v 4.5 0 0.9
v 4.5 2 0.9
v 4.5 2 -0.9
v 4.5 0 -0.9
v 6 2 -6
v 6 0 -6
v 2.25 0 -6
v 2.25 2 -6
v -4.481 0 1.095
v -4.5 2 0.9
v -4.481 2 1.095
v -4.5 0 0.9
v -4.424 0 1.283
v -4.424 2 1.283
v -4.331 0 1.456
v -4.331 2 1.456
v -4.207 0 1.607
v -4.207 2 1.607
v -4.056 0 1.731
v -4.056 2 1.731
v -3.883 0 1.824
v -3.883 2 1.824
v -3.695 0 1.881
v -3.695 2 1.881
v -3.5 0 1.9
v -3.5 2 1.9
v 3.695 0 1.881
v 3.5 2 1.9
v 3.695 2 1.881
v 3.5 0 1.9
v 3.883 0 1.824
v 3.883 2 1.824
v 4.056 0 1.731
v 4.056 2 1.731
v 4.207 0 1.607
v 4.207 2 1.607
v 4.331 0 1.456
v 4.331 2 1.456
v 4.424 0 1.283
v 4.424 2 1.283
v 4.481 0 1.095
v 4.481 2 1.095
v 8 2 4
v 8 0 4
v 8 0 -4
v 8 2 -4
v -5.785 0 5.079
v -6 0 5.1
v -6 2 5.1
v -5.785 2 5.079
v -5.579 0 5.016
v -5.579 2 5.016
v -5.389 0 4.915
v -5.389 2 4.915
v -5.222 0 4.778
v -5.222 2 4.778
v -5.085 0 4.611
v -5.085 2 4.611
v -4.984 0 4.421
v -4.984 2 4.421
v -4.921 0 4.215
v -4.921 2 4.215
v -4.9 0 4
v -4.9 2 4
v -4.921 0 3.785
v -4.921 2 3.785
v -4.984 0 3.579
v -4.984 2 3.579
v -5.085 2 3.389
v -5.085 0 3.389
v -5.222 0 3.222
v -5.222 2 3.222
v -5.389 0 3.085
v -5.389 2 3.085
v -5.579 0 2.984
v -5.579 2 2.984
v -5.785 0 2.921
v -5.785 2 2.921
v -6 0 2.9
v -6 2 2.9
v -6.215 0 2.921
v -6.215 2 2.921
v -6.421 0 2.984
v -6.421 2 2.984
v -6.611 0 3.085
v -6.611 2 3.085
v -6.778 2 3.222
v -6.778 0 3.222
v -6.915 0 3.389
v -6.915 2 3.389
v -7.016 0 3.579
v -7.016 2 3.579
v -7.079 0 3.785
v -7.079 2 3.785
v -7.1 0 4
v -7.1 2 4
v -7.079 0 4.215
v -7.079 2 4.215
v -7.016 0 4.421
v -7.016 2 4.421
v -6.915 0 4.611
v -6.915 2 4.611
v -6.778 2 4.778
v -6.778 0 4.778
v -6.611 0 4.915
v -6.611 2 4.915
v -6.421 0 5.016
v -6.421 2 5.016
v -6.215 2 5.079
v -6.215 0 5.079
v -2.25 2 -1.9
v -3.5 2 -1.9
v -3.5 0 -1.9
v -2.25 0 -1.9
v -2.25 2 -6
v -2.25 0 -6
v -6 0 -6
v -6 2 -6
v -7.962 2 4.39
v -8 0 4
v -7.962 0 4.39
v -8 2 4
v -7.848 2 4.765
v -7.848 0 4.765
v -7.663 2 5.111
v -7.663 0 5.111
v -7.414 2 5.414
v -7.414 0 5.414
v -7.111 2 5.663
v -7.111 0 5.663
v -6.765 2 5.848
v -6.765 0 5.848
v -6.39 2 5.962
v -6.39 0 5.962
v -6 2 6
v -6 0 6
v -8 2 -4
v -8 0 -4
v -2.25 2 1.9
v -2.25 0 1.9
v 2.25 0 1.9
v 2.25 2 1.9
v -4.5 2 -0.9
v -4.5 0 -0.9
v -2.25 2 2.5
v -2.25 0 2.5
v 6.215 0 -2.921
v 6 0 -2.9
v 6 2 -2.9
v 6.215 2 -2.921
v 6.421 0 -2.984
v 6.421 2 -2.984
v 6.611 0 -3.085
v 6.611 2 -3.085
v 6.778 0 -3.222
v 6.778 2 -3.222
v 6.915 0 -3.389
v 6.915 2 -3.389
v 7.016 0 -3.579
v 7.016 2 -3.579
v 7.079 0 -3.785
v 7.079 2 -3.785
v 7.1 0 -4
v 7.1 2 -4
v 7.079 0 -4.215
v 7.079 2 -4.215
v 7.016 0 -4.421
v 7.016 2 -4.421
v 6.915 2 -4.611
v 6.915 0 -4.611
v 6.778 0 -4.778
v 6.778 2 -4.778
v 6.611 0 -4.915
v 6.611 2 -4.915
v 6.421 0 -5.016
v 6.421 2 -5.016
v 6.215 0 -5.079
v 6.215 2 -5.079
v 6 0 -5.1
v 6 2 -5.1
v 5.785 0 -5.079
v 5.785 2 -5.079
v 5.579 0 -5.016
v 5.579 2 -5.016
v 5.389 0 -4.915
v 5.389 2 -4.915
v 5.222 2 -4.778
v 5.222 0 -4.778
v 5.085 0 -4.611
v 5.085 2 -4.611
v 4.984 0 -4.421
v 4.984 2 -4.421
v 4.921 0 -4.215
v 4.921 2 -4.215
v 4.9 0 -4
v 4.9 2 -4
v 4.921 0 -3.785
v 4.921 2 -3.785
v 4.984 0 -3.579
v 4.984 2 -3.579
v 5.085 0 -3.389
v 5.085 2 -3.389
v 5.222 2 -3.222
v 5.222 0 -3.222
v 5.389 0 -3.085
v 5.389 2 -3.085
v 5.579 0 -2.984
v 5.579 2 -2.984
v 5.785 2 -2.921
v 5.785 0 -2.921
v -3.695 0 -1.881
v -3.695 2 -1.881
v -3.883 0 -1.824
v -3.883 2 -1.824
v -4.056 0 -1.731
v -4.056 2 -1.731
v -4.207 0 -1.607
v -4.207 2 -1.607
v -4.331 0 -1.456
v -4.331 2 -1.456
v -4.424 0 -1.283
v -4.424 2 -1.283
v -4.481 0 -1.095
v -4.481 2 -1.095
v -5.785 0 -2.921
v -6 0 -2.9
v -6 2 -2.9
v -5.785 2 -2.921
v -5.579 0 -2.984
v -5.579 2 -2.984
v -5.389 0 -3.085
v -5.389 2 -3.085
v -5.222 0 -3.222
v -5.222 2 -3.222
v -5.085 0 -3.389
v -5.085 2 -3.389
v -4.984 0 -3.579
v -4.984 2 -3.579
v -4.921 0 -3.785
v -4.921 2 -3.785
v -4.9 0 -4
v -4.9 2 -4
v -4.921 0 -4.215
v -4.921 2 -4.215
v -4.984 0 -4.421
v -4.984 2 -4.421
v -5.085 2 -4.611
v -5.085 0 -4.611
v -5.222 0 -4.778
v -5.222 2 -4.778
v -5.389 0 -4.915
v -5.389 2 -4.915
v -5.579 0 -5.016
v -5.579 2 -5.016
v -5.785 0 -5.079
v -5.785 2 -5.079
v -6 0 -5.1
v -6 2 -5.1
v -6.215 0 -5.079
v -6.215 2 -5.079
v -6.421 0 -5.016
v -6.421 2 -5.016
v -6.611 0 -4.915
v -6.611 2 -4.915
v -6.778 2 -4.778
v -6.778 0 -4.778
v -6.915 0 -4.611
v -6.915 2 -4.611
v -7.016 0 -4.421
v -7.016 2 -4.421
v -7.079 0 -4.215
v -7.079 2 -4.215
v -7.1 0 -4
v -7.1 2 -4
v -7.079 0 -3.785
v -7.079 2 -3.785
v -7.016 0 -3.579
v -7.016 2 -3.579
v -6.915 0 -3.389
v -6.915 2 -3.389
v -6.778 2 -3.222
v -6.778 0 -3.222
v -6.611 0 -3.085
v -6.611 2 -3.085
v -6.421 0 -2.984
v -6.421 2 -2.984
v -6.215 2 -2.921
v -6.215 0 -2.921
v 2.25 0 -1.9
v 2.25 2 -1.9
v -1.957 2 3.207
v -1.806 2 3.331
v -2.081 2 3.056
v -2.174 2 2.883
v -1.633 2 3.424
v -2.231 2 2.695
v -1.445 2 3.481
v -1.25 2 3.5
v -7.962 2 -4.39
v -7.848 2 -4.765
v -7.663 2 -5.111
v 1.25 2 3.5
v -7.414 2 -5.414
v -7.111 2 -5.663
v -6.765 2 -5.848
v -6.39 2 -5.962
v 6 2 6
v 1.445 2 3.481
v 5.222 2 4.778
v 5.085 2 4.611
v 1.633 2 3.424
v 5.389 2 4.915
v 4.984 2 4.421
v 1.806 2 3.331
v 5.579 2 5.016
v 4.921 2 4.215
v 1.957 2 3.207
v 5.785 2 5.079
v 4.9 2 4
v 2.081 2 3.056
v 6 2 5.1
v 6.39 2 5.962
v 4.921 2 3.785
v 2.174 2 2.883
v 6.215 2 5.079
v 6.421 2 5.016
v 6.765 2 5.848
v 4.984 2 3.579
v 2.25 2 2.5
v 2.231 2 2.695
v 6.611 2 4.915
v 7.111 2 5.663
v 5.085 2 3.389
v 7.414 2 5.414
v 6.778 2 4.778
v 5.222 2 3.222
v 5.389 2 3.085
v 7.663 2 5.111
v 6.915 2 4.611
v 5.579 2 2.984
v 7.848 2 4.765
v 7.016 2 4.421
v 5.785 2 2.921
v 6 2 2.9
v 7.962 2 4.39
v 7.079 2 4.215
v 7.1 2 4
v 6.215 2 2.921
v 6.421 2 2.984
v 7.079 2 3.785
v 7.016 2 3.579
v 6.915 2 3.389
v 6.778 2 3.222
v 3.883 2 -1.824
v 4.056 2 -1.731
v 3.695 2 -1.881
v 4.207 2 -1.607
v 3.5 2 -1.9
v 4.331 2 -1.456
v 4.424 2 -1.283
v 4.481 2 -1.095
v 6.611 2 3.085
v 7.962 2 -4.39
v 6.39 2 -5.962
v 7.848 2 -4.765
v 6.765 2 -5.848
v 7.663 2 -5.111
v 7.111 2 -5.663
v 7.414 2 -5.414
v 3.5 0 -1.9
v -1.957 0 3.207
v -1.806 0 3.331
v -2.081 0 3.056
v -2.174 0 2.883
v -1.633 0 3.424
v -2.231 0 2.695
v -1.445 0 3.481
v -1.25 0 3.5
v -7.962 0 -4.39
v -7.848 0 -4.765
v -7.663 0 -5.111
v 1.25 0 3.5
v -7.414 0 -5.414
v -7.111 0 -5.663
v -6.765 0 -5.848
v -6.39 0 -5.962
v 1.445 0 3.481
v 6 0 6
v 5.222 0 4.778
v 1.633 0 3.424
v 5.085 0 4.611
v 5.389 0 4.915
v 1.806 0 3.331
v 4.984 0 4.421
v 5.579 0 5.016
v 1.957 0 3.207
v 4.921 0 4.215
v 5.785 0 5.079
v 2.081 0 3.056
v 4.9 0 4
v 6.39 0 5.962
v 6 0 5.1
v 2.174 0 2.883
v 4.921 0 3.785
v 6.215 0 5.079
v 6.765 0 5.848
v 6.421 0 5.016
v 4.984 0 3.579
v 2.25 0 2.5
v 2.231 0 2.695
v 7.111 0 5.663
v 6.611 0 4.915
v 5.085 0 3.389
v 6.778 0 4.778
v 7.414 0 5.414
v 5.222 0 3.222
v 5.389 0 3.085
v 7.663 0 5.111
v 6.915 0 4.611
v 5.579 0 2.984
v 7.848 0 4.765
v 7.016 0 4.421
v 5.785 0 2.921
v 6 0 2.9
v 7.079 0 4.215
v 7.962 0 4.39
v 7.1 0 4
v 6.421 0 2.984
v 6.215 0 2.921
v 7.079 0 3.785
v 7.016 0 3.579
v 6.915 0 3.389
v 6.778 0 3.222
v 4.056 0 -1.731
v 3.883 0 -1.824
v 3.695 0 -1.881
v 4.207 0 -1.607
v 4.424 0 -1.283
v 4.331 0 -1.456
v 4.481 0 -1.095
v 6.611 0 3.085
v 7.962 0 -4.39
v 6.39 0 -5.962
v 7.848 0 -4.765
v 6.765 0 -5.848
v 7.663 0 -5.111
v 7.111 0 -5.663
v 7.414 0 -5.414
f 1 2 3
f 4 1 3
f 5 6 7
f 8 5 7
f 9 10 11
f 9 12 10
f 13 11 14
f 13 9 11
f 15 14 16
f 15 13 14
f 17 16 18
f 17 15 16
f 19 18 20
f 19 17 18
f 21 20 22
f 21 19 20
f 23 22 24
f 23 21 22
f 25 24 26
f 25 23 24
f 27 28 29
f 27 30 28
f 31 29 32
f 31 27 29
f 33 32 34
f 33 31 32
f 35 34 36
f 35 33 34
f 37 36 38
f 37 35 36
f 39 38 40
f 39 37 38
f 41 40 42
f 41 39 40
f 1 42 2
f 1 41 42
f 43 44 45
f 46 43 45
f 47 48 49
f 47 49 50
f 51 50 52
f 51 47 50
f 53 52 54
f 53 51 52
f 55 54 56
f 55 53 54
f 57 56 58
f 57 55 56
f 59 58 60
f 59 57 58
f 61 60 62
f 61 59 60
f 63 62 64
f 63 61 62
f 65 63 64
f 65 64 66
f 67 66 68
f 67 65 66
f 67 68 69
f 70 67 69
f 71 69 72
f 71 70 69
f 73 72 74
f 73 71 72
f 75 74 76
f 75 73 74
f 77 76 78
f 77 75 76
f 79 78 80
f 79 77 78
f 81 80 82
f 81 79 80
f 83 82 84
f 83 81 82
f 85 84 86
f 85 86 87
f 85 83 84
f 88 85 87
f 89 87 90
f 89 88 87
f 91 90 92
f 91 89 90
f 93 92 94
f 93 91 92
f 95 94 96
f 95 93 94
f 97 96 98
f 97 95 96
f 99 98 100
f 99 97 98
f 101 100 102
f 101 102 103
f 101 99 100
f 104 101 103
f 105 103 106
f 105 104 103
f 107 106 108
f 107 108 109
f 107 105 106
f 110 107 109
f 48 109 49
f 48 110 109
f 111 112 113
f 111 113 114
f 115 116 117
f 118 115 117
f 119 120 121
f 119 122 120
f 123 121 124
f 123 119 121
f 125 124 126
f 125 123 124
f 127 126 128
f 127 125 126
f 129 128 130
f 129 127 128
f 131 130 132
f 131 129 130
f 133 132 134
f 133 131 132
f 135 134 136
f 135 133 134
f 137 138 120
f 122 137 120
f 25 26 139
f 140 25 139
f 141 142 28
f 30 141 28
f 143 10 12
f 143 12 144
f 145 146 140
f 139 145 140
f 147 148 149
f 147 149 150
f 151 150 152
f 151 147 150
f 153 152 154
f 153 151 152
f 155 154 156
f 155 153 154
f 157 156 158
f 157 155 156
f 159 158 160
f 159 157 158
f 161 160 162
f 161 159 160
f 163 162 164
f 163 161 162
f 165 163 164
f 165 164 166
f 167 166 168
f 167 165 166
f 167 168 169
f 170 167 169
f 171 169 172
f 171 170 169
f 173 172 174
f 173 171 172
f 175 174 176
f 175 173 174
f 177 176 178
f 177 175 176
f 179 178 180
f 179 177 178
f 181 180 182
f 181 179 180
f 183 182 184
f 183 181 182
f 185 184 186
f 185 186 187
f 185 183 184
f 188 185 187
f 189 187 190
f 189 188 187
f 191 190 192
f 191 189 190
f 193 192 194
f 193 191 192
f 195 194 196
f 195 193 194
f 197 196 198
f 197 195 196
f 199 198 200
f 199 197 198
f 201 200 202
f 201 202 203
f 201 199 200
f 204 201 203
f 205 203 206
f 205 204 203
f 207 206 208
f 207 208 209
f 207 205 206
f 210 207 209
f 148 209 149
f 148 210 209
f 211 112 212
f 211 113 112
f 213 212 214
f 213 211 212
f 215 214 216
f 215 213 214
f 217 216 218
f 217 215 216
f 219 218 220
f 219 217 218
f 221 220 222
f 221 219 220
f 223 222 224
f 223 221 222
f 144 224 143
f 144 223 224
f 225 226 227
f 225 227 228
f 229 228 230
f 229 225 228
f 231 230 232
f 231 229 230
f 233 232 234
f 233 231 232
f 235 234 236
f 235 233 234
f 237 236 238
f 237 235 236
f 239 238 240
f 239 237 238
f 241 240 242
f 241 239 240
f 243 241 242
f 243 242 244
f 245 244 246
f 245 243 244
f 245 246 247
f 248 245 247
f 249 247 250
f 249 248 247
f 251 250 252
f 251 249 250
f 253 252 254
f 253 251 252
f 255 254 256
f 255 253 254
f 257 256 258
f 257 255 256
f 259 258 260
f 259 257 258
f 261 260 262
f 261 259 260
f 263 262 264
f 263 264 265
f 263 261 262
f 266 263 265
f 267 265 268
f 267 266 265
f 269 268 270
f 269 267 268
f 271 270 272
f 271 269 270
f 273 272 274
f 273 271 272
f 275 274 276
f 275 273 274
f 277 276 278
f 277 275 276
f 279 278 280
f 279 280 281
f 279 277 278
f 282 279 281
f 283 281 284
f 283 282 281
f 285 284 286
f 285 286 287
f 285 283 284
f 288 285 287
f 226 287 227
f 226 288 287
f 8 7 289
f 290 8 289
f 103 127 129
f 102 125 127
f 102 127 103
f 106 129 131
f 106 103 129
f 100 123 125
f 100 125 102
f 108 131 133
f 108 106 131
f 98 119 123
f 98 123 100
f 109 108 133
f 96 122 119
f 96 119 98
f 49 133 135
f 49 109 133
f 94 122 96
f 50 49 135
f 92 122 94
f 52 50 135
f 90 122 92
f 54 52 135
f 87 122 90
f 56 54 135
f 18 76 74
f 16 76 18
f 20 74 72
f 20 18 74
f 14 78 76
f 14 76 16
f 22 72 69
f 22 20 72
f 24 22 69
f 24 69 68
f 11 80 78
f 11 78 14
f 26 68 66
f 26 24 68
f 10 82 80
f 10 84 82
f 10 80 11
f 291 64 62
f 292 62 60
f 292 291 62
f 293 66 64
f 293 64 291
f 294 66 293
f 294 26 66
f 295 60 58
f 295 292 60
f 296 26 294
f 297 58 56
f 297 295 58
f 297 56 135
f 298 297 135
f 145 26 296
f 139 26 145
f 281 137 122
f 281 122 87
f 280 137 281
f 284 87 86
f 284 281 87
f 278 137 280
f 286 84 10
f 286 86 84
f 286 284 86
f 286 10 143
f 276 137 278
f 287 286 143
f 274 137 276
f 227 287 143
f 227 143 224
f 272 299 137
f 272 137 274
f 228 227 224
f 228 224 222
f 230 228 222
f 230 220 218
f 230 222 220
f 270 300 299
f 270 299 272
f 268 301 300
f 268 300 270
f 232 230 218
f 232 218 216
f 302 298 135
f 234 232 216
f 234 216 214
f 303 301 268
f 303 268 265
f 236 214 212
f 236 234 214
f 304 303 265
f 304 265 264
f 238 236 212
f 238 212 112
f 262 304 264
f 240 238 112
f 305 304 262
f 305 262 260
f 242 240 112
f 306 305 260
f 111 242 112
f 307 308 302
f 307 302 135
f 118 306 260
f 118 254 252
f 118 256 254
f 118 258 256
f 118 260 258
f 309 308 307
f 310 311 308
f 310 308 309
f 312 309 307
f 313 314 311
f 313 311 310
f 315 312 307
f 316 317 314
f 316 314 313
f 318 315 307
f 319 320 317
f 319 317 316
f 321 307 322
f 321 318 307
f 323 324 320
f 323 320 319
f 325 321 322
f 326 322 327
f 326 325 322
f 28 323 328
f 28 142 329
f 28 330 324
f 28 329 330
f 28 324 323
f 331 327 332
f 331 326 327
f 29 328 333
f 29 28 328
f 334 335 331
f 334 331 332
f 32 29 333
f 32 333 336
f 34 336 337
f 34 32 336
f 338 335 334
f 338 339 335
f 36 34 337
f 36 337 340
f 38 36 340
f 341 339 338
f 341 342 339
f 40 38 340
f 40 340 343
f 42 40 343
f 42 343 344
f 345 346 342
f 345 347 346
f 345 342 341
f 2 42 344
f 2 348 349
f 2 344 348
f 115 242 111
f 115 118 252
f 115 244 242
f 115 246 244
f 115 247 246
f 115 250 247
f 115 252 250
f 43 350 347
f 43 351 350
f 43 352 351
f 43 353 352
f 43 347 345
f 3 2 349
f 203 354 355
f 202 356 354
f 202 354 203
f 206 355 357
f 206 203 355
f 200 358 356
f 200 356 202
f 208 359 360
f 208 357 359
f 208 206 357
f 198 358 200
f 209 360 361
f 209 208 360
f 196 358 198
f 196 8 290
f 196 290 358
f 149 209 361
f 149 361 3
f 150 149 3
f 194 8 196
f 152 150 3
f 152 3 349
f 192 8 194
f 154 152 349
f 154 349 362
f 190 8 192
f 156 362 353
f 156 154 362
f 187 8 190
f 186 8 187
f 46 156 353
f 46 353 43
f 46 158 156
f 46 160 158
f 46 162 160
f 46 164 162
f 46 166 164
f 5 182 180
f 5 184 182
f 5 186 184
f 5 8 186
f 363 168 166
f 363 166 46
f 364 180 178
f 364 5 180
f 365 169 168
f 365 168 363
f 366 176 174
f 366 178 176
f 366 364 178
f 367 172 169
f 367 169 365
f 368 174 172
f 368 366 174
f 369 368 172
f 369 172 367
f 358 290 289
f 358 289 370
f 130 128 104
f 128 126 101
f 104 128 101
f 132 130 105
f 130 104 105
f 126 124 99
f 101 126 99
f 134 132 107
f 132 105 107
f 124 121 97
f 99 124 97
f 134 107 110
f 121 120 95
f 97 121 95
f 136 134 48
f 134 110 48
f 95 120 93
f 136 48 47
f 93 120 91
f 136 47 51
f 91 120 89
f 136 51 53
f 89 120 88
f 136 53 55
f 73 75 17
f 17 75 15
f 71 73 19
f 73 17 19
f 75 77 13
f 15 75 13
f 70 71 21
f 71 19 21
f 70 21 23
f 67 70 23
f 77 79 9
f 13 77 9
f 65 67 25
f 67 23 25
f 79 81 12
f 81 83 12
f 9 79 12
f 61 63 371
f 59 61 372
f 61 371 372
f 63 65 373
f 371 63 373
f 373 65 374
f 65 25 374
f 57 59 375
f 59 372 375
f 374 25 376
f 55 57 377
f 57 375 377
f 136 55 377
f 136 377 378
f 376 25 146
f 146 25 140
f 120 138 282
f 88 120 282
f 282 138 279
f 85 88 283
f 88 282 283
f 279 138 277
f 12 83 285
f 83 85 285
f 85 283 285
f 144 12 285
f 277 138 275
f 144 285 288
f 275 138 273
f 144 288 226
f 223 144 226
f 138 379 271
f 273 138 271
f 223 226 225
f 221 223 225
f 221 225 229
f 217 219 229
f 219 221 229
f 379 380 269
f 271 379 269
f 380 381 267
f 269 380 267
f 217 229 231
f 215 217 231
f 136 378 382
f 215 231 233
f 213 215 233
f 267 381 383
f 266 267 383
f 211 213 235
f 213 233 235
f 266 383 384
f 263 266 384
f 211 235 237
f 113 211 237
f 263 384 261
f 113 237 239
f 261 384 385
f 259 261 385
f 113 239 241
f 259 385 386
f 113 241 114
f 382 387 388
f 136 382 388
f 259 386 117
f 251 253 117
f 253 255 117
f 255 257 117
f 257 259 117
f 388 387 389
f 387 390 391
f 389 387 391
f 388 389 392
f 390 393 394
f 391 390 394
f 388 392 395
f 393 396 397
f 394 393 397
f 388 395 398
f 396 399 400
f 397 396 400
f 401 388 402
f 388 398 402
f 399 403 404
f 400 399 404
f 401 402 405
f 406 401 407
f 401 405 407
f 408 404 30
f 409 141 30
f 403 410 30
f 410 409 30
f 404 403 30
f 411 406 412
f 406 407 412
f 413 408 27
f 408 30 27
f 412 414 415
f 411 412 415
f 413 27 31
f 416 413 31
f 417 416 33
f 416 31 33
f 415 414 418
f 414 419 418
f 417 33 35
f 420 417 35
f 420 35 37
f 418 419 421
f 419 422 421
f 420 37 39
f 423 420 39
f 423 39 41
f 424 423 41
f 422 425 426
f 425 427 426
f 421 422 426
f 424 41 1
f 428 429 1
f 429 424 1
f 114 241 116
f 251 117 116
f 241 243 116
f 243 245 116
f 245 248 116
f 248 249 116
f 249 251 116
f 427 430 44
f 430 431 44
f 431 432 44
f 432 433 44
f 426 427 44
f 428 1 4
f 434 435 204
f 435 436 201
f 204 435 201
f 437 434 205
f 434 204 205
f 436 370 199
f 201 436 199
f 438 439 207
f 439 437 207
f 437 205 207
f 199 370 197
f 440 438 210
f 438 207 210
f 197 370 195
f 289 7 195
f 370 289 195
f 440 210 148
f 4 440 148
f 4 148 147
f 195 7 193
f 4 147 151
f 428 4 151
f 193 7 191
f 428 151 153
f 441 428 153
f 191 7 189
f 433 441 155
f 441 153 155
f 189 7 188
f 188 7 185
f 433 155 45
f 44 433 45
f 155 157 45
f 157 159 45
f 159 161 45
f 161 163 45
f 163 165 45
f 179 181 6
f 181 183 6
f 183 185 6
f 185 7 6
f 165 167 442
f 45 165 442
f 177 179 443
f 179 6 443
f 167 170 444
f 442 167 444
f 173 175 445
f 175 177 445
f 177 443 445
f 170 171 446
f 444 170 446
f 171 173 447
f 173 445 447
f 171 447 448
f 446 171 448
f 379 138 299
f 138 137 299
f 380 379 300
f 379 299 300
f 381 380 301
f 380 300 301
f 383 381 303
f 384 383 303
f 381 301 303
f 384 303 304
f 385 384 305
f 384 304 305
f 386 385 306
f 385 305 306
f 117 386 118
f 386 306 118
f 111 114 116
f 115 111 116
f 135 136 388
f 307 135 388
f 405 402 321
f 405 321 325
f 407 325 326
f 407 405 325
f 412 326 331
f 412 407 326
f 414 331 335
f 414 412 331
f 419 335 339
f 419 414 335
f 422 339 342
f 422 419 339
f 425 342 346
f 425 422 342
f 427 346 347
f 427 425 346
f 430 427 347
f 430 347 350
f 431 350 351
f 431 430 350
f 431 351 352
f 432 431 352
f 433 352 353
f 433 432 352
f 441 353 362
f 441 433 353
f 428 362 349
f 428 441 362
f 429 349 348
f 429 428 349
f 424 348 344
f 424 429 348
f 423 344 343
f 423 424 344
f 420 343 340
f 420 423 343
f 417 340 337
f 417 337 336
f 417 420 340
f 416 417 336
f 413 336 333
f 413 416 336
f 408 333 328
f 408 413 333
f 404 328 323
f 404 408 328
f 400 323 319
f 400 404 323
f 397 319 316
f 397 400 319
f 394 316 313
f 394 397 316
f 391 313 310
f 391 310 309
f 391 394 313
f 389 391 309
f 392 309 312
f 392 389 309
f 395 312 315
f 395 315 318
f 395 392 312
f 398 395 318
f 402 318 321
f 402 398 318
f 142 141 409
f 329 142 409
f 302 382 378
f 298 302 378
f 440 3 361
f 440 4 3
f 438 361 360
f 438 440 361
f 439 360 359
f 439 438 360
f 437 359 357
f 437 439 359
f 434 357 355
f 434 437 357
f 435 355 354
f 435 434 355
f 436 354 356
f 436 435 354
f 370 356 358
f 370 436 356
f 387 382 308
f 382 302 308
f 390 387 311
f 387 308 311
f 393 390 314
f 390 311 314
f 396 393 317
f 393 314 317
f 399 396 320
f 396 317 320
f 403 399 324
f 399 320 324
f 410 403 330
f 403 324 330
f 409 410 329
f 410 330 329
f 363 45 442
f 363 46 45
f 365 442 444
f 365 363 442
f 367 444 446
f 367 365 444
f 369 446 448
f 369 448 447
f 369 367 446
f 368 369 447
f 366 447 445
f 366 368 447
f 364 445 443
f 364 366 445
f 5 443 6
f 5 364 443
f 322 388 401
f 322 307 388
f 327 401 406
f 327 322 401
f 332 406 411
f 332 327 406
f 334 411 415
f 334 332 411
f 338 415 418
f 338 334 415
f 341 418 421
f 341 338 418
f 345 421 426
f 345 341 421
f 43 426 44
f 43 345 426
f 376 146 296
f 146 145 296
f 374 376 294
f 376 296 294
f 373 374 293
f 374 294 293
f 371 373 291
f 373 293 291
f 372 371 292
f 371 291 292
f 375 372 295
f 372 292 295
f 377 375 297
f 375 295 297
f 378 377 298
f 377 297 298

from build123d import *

# Parameters (mm, degrees)
SKETCH_1_R          = 1.1
EXTRUDE_1_DEPTH     = 2
SKETCH_2_W          = 9
SKETCH_2_H          = 3.8
CUT_EXTRUDE_1_DEPTH = 11.198039027
FILLET_1_R          = 2
FILLET_2_R          = 1


with BuildPart() as part:
    # 草图1 → 凸台-拉伸1 (new body)
    with BuildSketch(Plane(origin=(0, 0, 0), x_dir=(1, 0, 0), z_dir=(0, 1, 0))):
        Polygon((-8, 6), (-8, -6), (8, -6), (8, 6), (2.25, 6), (2.25, -3.5), (-2.25, -3.5), (-2.25, 6), align=None)
        with Locations(Location((-6, -4, 0), (0, 0, 270))):
            Circle(SKETCH_1_R, mode=Mode.SUBTRACT)
        with Locations(Location((6, -4, 0), (0, 0, 270))):
            Circle(SKETCH_1_R, mode=Mode.SUBTRACT)
        with Locations(Location((-6, 4, 0), (0, 0, 270))):
            Circle(SKETCH_1_R, mode=Mode.SUBTRACT)
        with Locations(Location((6, 4, 0), (0, 0, 270))):
            Circle(SKETCH_1_R, mode=Mode.SUBTRACT)
    extrude(amount=EXTRUDE_1_DEPTH)

    # 草图2 → 切除-拉伸1 (cut, through all)
    with BuildSketch(Plane(origin=(0, 2, 0), x_dir=(1, 0, 0), z_dir=(0, 1, 0))):
        Rectangle(SKETCH_2_W, SKETCH_2_H)
    extrude(amount=-CUT_EXTRUDE_1_DEPTH, mode=Mode.SUBTRACT)

    # 圆角1
    fillet_1_edges = [part.edges().sort_by_distance(p)[0] for p in [
        (8, 1, -6),
        (8, 1, 6),
        (-8, 1, 6),
        (-8, 1, -6),
    ]]
    fillet(fillet_1_edges, radius=FILLET_1_R)

    # 圆角2
    fillet_2_edges = [part.edges().sort_by_distance(p)[0] for p in [
        (-2.25, 1, 3.5),
        (2.25, 1, 3.5),
        (-4.5, 1, -1.9),
        (4.5, 1, -1.9),
        (4.5, 1, 1.9),
        (-4.5, 1, 1.9),
    ]]
    fillet(fillet_2_edges, radius=FILLET_2_R)


solid = part.part
